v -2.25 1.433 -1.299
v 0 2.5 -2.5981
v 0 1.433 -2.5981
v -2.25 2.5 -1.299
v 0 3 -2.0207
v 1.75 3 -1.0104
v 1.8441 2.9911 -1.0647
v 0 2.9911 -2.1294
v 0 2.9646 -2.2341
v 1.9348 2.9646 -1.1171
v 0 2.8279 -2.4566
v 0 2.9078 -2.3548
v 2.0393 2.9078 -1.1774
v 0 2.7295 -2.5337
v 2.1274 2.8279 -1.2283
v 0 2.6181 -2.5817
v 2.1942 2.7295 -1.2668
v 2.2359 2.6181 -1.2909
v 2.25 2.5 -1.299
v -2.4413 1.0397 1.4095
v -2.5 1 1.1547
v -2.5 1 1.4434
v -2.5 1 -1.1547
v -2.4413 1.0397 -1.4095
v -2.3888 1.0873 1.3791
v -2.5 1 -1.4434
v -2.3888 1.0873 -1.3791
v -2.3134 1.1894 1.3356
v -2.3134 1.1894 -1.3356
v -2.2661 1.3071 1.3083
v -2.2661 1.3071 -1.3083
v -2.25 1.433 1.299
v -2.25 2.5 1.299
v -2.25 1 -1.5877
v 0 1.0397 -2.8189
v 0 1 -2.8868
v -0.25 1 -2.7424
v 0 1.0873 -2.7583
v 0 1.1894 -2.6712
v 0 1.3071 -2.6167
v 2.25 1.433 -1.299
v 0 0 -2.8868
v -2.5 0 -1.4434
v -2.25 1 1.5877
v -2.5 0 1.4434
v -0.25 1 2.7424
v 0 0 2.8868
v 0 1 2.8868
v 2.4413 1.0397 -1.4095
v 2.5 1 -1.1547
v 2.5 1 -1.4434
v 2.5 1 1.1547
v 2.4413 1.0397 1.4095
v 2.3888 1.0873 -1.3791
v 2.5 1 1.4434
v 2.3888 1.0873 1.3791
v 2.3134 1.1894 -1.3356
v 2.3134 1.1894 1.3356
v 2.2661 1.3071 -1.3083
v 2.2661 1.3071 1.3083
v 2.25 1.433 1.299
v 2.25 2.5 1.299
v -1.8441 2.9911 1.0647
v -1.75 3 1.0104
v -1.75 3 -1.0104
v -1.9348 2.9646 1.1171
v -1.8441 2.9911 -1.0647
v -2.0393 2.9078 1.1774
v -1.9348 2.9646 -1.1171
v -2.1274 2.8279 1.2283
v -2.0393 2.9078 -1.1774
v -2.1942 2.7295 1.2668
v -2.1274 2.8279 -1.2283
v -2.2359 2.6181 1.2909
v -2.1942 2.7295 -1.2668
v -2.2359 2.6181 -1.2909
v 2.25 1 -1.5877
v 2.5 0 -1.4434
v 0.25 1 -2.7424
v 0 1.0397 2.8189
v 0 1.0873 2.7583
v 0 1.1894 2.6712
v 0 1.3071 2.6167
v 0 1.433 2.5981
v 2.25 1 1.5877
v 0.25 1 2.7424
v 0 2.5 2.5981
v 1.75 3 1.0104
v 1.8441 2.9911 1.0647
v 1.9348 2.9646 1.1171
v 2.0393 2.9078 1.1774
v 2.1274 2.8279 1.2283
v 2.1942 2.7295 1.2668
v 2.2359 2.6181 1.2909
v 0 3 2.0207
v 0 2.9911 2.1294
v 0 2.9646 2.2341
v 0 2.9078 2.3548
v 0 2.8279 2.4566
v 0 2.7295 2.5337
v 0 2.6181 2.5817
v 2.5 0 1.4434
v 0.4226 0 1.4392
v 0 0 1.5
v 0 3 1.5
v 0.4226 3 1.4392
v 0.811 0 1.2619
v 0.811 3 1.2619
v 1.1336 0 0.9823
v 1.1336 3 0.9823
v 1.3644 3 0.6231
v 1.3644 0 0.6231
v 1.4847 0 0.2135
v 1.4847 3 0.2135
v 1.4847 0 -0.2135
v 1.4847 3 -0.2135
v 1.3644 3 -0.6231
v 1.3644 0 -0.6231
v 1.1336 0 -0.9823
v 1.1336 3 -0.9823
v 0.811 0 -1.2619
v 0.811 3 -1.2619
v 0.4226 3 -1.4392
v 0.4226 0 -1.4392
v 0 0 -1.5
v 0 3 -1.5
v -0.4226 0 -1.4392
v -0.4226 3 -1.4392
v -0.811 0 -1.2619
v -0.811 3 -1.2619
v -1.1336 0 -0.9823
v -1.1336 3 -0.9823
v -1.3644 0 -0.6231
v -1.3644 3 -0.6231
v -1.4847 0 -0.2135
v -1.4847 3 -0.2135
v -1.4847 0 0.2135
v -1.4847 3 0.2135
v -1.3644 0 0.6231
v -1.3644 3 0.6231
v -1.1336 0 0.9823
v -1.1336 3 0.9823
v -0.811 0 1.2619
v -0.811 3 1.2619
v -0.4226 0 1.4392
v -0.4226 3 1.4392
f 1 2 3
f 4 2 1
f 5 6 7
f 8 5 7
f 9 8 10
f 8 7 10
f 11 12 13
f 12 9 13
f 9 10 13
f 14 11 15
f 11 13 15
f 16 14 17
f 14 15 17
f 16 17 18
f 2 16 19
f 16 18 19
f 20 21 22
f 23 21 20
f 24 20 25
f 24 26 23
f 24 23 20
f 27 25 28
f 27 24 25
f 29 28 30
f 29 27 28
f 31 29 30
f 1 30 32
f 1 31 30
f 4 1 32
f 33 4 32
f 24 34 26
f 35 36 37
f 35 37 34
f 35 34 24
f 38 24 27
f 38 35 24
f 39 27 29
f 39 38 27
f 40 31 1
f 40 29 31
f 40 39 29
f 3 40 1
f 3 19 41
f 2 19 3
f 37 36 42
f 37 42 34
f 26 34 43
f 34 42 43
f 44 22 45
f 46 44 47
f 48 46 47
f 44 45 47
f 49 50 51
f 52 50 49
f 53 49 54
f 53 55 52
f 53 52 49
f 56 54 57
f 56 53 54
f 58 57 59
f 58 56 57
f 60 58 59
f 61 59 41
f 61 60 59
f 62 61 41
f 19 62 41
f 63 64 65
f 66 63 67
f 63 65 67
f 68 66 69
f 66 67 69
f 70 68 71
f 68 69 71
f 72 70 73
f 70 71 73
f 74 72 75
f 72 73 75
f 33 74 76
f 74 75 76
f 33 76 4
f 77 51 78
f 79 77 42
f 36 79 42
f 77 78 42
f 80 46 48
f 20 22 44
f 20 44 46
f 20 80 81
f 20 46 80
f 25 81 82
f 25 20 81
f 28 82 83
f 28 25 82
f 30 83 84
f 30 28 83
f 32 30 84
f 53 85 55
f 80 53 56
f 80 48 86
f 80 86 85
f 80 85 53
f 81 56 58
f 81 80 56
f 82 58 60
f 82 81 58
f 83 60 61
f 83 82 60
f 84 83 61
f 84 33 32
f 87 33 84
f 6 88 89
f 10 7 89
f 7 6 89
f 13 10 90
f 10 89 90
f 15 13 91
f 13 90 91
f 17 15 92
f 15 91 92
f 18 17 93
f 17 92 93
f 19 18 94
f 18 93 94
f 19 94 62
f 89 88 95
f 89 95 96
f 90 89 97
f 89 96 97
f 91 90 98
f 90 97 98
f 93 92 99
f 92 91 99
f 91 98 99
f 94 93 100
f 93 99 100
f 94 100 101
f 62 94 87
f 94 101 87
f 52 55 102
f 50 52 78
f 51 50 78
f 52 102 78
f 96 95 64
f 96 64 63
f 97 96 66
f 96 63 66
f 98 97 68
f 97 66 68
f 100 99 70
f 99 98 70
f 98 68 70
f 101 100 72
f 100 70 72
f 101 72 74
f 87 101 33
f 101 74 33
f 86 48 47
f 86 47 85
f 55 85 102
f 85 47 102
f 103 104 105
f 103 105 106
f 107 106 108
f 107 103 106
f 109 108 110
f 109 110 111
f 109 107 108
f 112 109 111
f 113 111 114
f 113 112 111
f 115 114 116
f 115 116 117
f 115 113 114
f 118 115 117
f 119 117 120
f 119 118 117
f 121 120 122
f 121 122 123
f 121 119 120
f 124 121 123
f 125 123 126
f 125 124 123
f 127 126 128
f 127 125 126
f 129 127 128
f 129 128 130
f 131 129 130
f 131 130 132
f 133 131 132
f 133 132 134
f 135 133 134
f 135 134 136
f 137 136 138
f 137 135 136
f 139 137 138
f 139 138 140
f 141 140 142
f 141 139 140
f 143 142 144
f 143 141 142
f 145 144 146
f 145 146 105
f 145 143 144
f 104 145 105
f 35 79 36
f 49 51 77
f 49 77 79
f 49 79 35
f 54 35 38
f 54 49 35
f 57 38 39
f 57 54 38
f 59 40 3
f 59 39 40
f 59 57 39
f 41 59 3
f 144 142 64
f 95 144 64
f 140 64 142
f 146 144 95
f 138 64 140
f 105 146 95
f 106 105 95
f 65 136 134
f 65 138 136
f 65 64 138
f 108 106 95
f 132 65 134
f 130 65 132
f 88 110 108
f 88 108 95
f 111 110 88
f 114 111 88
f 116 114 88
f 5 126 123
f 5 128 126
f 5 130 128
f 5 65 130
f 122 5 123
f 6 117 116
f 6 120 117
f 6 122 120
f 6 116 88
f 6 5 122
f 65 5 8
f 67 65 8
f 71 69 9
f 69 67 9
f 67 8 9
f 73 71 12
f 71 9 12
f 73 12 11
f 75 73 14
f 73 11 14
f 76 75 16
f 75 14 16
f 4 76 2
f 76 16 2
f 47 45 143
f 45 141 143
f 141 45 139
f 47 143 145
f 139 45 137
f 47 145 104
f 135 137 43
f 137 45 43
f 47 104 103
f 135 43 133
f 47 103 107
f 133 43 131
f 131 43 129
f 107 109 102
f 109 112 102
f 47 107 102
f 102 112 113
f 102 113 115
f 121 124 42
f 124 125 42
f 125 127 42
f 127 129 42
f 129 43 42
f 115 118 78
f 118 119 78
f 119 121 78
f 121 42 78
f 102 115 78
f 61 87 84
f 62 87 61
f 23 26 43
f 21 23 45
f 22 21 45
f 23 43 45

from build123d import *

# Parameters (mm, degrees)
SKETCH1_R           = 1.5
BOSS_EXTRUDE1_DEPTH = 3
SKETCH2_R           = 3.632993492
CUT_EXTRUDE1_DEPTH  = 2
FILLET1_R           = 0.5


with BuildPart() as part:
    # Sketch1 → Boss-Extrude1 (new body)
    with BuildSketch(Plane(origin=(0, 0, 0), x_dir=(1, 0, 0), z_dir=(0, 1, 0))):
        Polygon((0, -2.886751346), (2.5, -1.443375673), (2.5, 1.443375673), (0, 2.886751346), (-2.5, 1.443375673), (-2.5, -1.443375673), align=None)
        with Locations(Location((0, 0, 0), (0, 0, 270))):
            Circle(SKETCH1_R, mode=Mode.SUBTRACT)
    extrude(amount=BOSS_EXTRUDE1_DEPTH)

    # Sketch2 → Cut-Extrude1 (cut)
    with BuildSketch(Plane(origin=(0, 3, 0), x_dir=(1, 0, 0), z_dir=(0, 1, 0))):
        Circle(SKETCH2_R)
        Polygon((2.25, 1.299038106), (0, 2.598076211), (-2.25, 1.299038106), (-2.25, -1.299038106), (0, -2.598076211), (2.25, -1.299038106), align=None, mode=Mode.SUBTRACT)
    extrude(amount=-CUT_EXTRUDE1_DEPTH, mode=Mode.SUBTRACT)

    # Fillet1
    # the kernel refuses this fillet: 0.5 mm, written as the material it adds along each edge
    with BuildSketch(Plane(origin=(-0.9375, 1, 3.139342089), x_dir=(0.5000000000000002, 7.10542735760069e-14, 0.8660254037844385), z_dir=(0.8660254037844386, 0, -0.5000000000000002))) as fillet1_piece_1_section:
        with BuildLine():
            CenterArc((0.5, -0.433012702), FILLET1_R, 120, 60)
            Line((0, -0.433012702), (0, 0))
            Line((0, 0), (0.25, 0))
        make_face()
    fillet1_piece_1 = extrude(amount=4.763139721, mode=Mode.PRIVATE)
    fillet1_piece_1 = split(fillet1_piece_1, bisect_by=Plane(origin=(2.25, 1, 3.139342089), z_dir=(-1, 0, 0)), keep=Keep.TOP, mode=Mode.PRIVATE)
    fillet1_piece_1 = split(fillet1_piece_1, bisect_by=Plane(origin=(-0.46875, 1, 2.327443273), z_dir=(0.4999999999999999, 0, -0.8660254037844387)), keep=Keep.TOP, mode=Mode.PRIVATE)
    add(fillet1_piece_1)
    with BuildSketch(Plane(origin=(2.25, 1, 2.38156986), x_dir=(1, 0, 0), z_dir=(0, 0, -1))) as fillet1_piece_2_section:
        with BuildLine():
            CenterArc((0.5, -0.433012702), FILLET1_R, 120, 60)
            Line((0, -0.433012702), (0, 0))
            Line((0, 0), (0.25, 0))
        make_face()
    fillet1_piece_2 = extrude(amount=4.763139721, mode=Mode.PRIVATE)
    fillet1_piece_2 = split(fillet1_piece_2, bisect_by=Plane(origin=(1.78125, 1, 1.569671044), z_dir=(-0.5000000000000002, 0, -0.8660254037844386)), keep=Keep.TOP, mode=Mode.PRIVATE)
    fillet1_piece_2 = split(fillet1_piece_2, bisect_by=Plane(origin=(3.84375, 1, -0.378886114), z_dir=(-0.49999999999999956, 0, 0.8660254037844389)), keep=Keep.TOP, mode=Mode.PRIVATE)
    add(fillet1_piece_2)
    with BuildSketch(Plane(origin=(3.1875, 1, -0.757772228), x_dir=(0.49999999999999956, 7.194245199570714e-14, -0.8660254037844388), z_dir=(-0.8660254037844389, 0, -0.49999999999999956))) as fillet1_piece_3_section:
        with BuildLine():
            CenterArc((0.5, -0.433012702), FILLET1_R, 120, 60)
            Line((0, -0.433012702), (0, 0))
            Line((0, 0), (0.25, 0))
        make_face()
    fillet1_piece_3 = extrude(amount=4.763139721, mode=Mode.PRIVATE)
    fillet1_piece_3 = split(fillet1_piece_3, bisect_by=Plane(origin=(2.25, 1, -0.757772228), z_dir=(-1, 0, 0)), keep=Keep.TOP, mode=Mode.PRIVATE)
    fillet1_piece_3 = split(fillet1_piece_3, bisect_by=Plane(origin=(1.59375, 1, -3.518228203), z_dir=(0.5000000000000002, 0, 0.8660254037844385)), keep=Keep.TOP, mode=Mode.PRIVATE)
    add(fillet1_piece_3)
    with BuildSketch(Plane(origin=(0.9375, 1, -3.139342089), x_dir=(-0.5000000000000003, 7.283063041540705e-14, -0.8660254037844386), z_dir=(-0.8660254037844386, 0, 0.5000000000000003))) as fillet1_piece_4_section:
        with BuildLine():
            CenterArc((0.5, -0.433012702), FILLET1_R, 120, 60)
            Line((0, -0.433012702), (0, 0))
            Line((0, 0), (0.25, 0))
        make_face()
    fillet1_piece_4 = extrude(amount=4.763139721, mode=Mode.PRIVATE)
    fillet1_piece_4 = split(fillet1_piece_4, bisect_by=Plane(origin=(0.46875, 1, -2.327443273), z_dir=(-0.49999999999999956, 0, 0.8660254037844389)), keep=Keep.TOP, mode=Mode.PRIVATE)
    fillet1_piece_4 = split(fillet1_piece_4, bisect_by=Plane(origin=(-2.25, 1, -3.139342089), z_dir=(1, 0, 0)), keep=Keep.TOP, mode=Mode.PRIVATE)
    add(fillet1_piece_4)
    with BuildSketch(Plane(origin=(-2.25, 1, -2.38156986), x_dir=(-1, 0, 0), z_dir=(0, 0, 1))) as fillet1_piece_5_section:
        with BuildLine():
            CenterArc((0.5, -0.433012702), FILLET1_R, 120, 60)
            Line((0, -0.433012702), (0, 0))
            Line((0, 0), (0.25, 0))
        make_face()
    fillet1_piece_5 = extrude(amount=4.763139721, mode=Mode.PRIVATE)
    fillet1_piece_5 = split(fillet1_piece_5, bisect_by=Plane(origin=(-3.84375, 1, 0.378886114), z_dir=(0.4999999999999999, 0, -0.8660254037844387)), keep=Keep.TOP, mode=Mode.PRIVATE)
    fillet1_piece_5 = split(fillet1_piece_5, bisect_by=Plane(origin=(-1.78125, 1, -1.569671044), z_dir=(0.5000000000000002, 0, 0.8660254037844385)), keep=Keep.TOP, mode=Mode.PRIVATE)
    add(fillet1_piece_5)
    with BuildSketch(Plane(origin=(-3.1875, 1, 0.757772228), x_dir=(-0.4999999999999999, 7.194245199570713e-14, 0.8660254037844387), z_dir=(0.8660254037844387, 0, 0.4999999999999999))) as fillet1_piece_6_section:
        with BuildLine():
            CenterArc((0.5, -0.433012702), FILLET1_R, 120, 60)
            Line((0, -0.433012702), (0, 0))
            Line((0, 0), (0.25, 0))
        make_face()
    fillet1_piece_6 = extrude(amount=4.763139721, mode=Mode.PRIVATE)
    fillet1_piece_6 = split(fillet1_piece_6, bisect_by=Plane(origin=(-1.59375, 1, 3.518228203), z_dir=(-0.5000000000000002, 0, -0.8660254037844386)), keep=Keep.TOP, mode=Mode.PRIVATE)
    fillet1_piece_6 = split(fillet1_piece_6, bisect_by=Plane(origin=(-2.25, 1, 0.757772228), z_dir=(1, 0, 0)), keep=Keep.TOP, mode=Mode.PRIVATE)
    add(fillet1_piece_6)
    with BuildSketch(Plane(origin=(-0.9375, 1, 3.139342089), x_dir=(0.5000000000000002, 7.10542735760069e-14, 0.8660254037844385), z_dir=(0.8660254037844386, 0, -0.5000000000000002))) as fillet1_piece_7a_section:
        with BuildLine():
            CenterArc((0.5, -0.433012702), FILLET1_R, 120, 60)
            Line((0, -0.433012702), (0, 0))
            Line((0, 0), (0.25, 0))
        make_face()
    fillet1_piece_7a = extrude(amount=4.763139721, mode=Mode.PRIVATE)
    fillet1_piece_7a = split(fillet1_piece_7a, bisect_by=Plane(origin=(-0.59375, 1, 2.543949624), z_dir=(0.49999999999999983, 0, -0.8660254037844387)), keep=Keep.TOP, mode=Mode.PRIVATE)
    fillet1_piece_7a = split(fillet1_piece_7a, bisect_by=Plane(origin=(-0.46875, 1, 2.327443273), z_dir=(-0.4999999999999999, 0, 0.8660254037844387)), keep=Keep.TOP, mode=Mode.PRIVATE)
    with BuildSketch(Plane(origin=(-3.1875, 1, 0.757772228), x_dir=(-0.4999999999999999, 7.194245199570713e-14, 0.8660254037844387), z_dir=(0.8660254037844387, 0, 0.4999999999999999))) as fillet1_piece_7b_section:
        with BuildLine():
            CenterArc((0.5, -0.433012702), FILLET1_R, 120, 60)
            Line((0, -0.433012702), (0, 0))
            Line((0, 0), (0.25, 0))
        make_face()
    fillet1_piece_7b = extrude(amount=4.763139721, mode=Mode.PRIVATE)
    fillet1_piece_7b = split(fillet1_piece_7b, bisect_by=Plane(origin=(-1.46875, 1, 3.734734554), z_dir=(-0.5000000000000001, 0, -0.8660254037844387)), keep=Keep.TOP, mode=Mode.PRIVATE)
    fillet1_piece_7b = split(fillet1_piece_7b, bisect_by=Plane(origin=(-1.59375, 1, 3.518228203), z_dir=(0.5000000000000002, 0, 0.8660254037844386)), keep=Keep.TOP, mode=Mode.PRIVATE)
    fillet1_piece_7 = fillet1_piece_7a & fillet1_piece_7b
    add(fillet1_piece_7)
    with BuildSketch(Plane(origin=(2.25, 1, 2.38156986), x_dir=(1, 0, 0), z_dir=(0, 0, -1))) as fillet1_piece_8a_section:
        with BuildLine():
            CenterArc((0.5, -0.433012702), FILLET1_R, 120, 60)
            Line((0, -0.433012702), (0, 0))
            Line((0, 0), (0.25, 0))
        make_face()
    fillet1_piece_8a = extrude(amount=4.763139721, mode=Mode.PRIVATE)
    fillet1_piece_8a = split(fillet1_piece_8a, bisect_by=Plane(origin=(1.90625, 1, 1.786177395), z_dir=(-0.5000000000000001, 0, -0.8660254037844387)), keep=Keep.TOP, mode=Mode.PRIVATE)
    fillet1_piece_8a = split(fillet1_piece_8a, bisect_by=Plane(origin=(1.78125, 1, 1.569671044), z_dir=(0.5000000000000002, 0, 0.8660254037844386)), keep=Keep.TOP, mode=Mode.PRIVATE)
    with BuildSketch(Plane(origin=(-0.9375, 1, 3.139342089), x_dir=(0.5000000000000002, 7.10542735760069e-14, 0.8660254037844385), z_dir=(0.8660254037844386, 0, -0.5000000000000002))) as fillet1_piece_8b_section:
        with BuildLine():
            CenterArc((0.5, -0.433012702), FILLET1_R, 120, 60)
            Line((0, -0.433012702), (0, 0))
            Line((0, 0), (0.25, 0))
        make_face()
    fillet1_piece_8b = extrude(amount=4.763139721, mode=Mode.PRIVATE)
    fillet1_piece_8b = split(fillet1_piece_8b, bisect_by=Plane(origin=(2.5, 1, 3.139342089), z_dir=(-1, 0, 0)), keep=Keep.TOP, mode=Mode.PRIVATE)
    fillet1_piece_8b = split(fillet1_piece_8b, bisect_by=Plane(origin=(2.25, 1, 3.139342089), z_dir=(1, 0, 0)), keep=Keep.TOP, mode=Mode.PRIVATE)
    fillet1_piece_8 = fillet1_piece_8a & fillet1_piece_8b
    add(fillet1_piece_8)
    with BuildSketch(Plane(origin=(2.25, 1, 2.38156986), x_dir=(1, 0, 0), z_dir=(0, 0, -1))) as fillet1_piece_9a_section:
        with BuildLine():
            CenterArc((0.5, -0.433012702), FILLET1_R, 120, 60)
            Line((0, -0.433012702), (0, 0))
            Line((0, 0), (0.25, 0))
        make_face()
    fillet1_piece_9a = extrude(amount=4.763139721, mode=Mode.PRIVATE)
    fillet1_piece_9a = split(fillet1_piece_9a, bisect_by=Plane(origin=(3.96875, 1, -0.595392465), z_dir=(-0.49999999999999967, 0, 0.8660254037844388)), keep=Keep.TOP, mode=Mode.PRIVATE)
    fillet1_piece_9a = split(fillet1_piece_9a, bisect_by=Plane(origin=(3.84375, 1, -0.378886114), z_dir=(0.49999999999999956, 0, -0.8660254037844389)), keep=Keep.TOP, mode=Mode.PRIVATE)
    with BuildSketch(Plane(origin=(3.1875, 1, -0.757772228), x_dir=(0.49999999999999956, 7.194245199570714e-14, -0.8660254037844388), z_dir=(-0.8660254037844389, 0, -0.49999999999999956))) as fillet1_piece_9b_section:
        with BuildLine():
            CenterArc((0.5, -0.433012702), FILLET1_R, 120, 60)
            Line((0, -0.433012702), (0, 0))
            Line((0, 0), (0.25, 0))
        make_face()
    fillet1_piece_9b = extrude(amount=4.763139721, mode=Mode.PRIVATE)
    fillet1_piece_9b = split(fillet1_piece_9b, bisect_by=Plane(origin=(2.5, 1, -0.757772228), z_dir=(-1, 0, 0)), keep=Keep.TOP, mode=Mode.PRIVATE)
    fillet1_piece_9b = split(fillet1_piece_9b, bisect_by=Plane(origin=(2.25, 1, -0.757772228), z_dir=(1, 0, 0)), keep=Keep.TOP, mode=Mode.PRIVATE)
    fillet1_piece_9 = fillet1_piece_9a & fillet1_piece_9b
    add(fillet1_piece_9)
    with BuildSketch(Plane(origin=(3.1875, 1, -0.757772228), x_dir=(0.49999999999999956, 7.194245199570714e-14, -0.8660254037844388), z_dir=(-0.8660254037844389, 0, -0.49999999999999956))) as fillet1_piece_10a_section:
        with BuildLine():
            CenterArc((0.5, -0.433012702), FILLET1_R, 120, 60)
            Line((0, -0.433012702), (0, 0))
            Line((0, 0), (0.25, 0))
        make_face()
    fillet1_piece_10a = extrude(amount=4.763139721, mode=Mode.PRIVATE)
    fillet1_piece_10a = split(fillet1_piece_10a, bisect_by=Plane(origin=(1.46875, 1, -3.734734554), z_dir=(0.5000000000000002, 0, 0.8660254037844386)), keep=Keep.TOP, mode=Mode.PRIVATE)
    fillet1_piece_10a = split(fillet1_piece_10a, bisect_by=Plane(origin=(1.59375, 1, -3.518228203), z_dir=(-0.5000000000000002, 0, -0.8660254037844385)), keep=Keep.TOP, mode=Mode.PRIVATE)
    with BuildSketch(Plane(origin=(0.9375, 1, -3.139342089), x_dir=(-0.5000000000000003, 7.283063041540705e-14, -0.8660254037844386), z_dir=(-0.8660254037844386, 0, 0.5000000000000003))) as fillet1_piece_10b_section:
        with BuildLine():
            CenterArc((0.5, -0.433012702), FILLET1_R, 120, 60)
            Line((0, -0.433012702), (0, 0))
            Line((0, 0), (0.25, 0))
        make_face()
    fillet1_piece_10b = extrude(amount=4.763139721, mode=Mode.PRIVATE)
    fillet1_piece_10b = split(fillet1_piece_10b, bisect_by=Plane(origin=(0.59375, 1, -2.543949624), z_dir=(-0.49999999999999967, 0, 0.8660254037844388)), keep=Keep.TOP, mode=Mode.PRIVATE)
    fillet1_piece_10b = split(fillet1_piece_10b, bisect_by=Plane(origin=(0.46875, 1, -2.327443273), z_dir=(0.49999999999999956, 0, -0.8660254037844389)), keep=Keep.TOP, mode=Mode.PRIVATE)
    fillet1_piece_10 = fillet1_piece_10a & fillet1_piece_10b
    add(fillet1_piece_10)
    with BuildSketch(Plane(origin=(0.9375, 1, -3.139342089), x_dir=(-0.5000000000000003, 7.283063041540705e-14, -0.8660254037844386), z_dir=(-0.8660254037844386, 0, 0.5000000000000003))) as fillet1_piece_11a_section:
        with BuildLine():
            CenterArc((0.5, -0.433012702), FILLET1_R, 120, 60)
            Line((0, -0.433012702), (0, 0))
            Line((0, 0), (0.25, 0))
        make_face()
    fillet1_piece_11a = extrude(amount=4.763139721, mode=Mode.PRIVATE)
    fillet1_piece_11a = split(fillet1_piece_11a, bisect_by=Plane(origin=(-2.5, 1, -3.139342089), z_dir=(1, 0, 0)), keep=Keep.TOP, mode=Mode.PRIVATE)
    fillet1_piece_11a = split(fillet1_piece_11a, bisect_by=Plane(origin=(-2.25, 1, -3.139342089), z_dir=(-1, 0, 0)), keep=Keep.TOP, mode=Mode.PRIVATE)
    with BuildSketch(Plane(origin=(-2.25, 1, -2.38156986), x_dir=(-1, 0, 0), z_dir=(0, 0, 1))) as fillet1_piece_11b_section:
        with BuildLine():
            CenterArc((0.5, -0.433012702), FILLET1_R, 120, 60)
            Line((0, -0.433012702), (0, 0))
            Line((0, 0), (0.25, 0))
        make_face()
    fillet1_piece_11b = extrude(amount=4.763139721, mode=Mode.PRIVATE)
    fillet1_piece_11b = split(fillet1_piece_11b, bisect_by=Plane(origin=(-1.90625, 1, -1.786177395), z_dir=(0.5000000000000002, 0, 0.8660254037844386)), keep=Keep.TOP, mode=Mode.PRIVATE)
    fillet1_piece_11b = split(fillet1_piece_11b, bisect_by=Plane(origin=(-1.78125, 1, -1.569671044), z_dir=(-0.5000000000000002, 0, -0.8660254037844385)), keep=Keep.TOP, mode=Mode.PRIVATE)
    fillet1_piece_11 = fillet1_piece_11a & fillet1_piece_11b
    add(fillet1_piece_11)
    with BuildSketch(Plane(origin=(-3.1875, 1, 0.757772228), x_dir=(-0.4999999999999999, 7.194245199570713e-14, 0.8660254037844387), z_dir=(0.8660254037844387, 0, 0.4999999999999999))) as fillet1_piece_12a_section:
        with BuildLine():
            CenterArc((0.5, -0.433012702), FILLET1_R, 120, 60)
            Line((0, -0.433012702), (0, 0))
            Line((0, 0), (0.25, 0))
        make_face()
    fillet1_piece_12a = extrude(amount=4.763139721, mode=Mode.PRIVATE)
    fillet1_piece_12a = split(fillet1_piece_12a, bisect_by=Plane(origin=(-2.5, 1, 0.757772228), z_dir=(1, 0, 0)), keep=Keep.TOP, mode=Mode.PRIVATE)
    fillet1_piece_12a = split(fillet1_piece_12a, bisect_by=Plane(origin=(-2.25, 1, 0.757772228), z_dir=(-1, 0, 0)), keep=Keep.TOP, mode=Mode.PRIVATE)
    with BuildSketch(Plane(origin=(-2.25, 1, -2.38156986), x_dir=(-1, 0, 0), z_dir=(0, 0, 1))) as fillet1_piece_12b_section:
        with BuildLine():
            CenterArc((0.5, -0.433012702), FILLET1_R, 120, 60)
            Line((0, -0.433012702), (0, 0))
            Line((0, 0), (0.25, 0))
        make_face()
    fillet1_piece_12b = extrude(amount=4.763139721, mode=Mode.PRIVATE)
    fillet1_piece_12b = split(fillet1_piece_12b, bisect_by=Plane(origin=(-3.96875, 1, 0.595392465), z_dir=(0.49999999999999983, 0, -0.8660254037844387)), keep=Keep.TOP, mode=Mode.PRIVATE)
    fillet1_piece_12b = split(fillet1_piece_12b, bisect_by=Plane(origin=(-3.84375, 1, 0.378886114), z_dir=(-0.4999999999999999, 0, 0.8660254037844387)), keep=Keep.TOP, mode=Mode.PRIVATE)
    fillet1_piece_12 = fillet1_piece_12a & fillet1_piece_12b
    add(fillet1_piece_12)
    # the kernel refuses this fillet: 0.5 mm, written as the material it takes off along each edge
    with BuildSketch(Plane(origin=(2.25, 3, 2.549038106), x_dir=(0, -1, 0), z_dir=(0, 0, -1)), Plane(origin=(-1.082531755, 3, 3.223076211), x_dir=(0, -1, 0), z_dir=(0.8660254037844386, 0, -0.5000000000000002)), Plane(origin=(-3.332531755, 3, 0.674038106), x_dir=(0, -1, 0), z_dir=(0.8660254037844387, 0, 0.4999999999999999)), Plane(origin=(-2.25, 3, -2.549038106), x_dir=(0, -1, 0), z_dir=(0, 0, 1)), Plane(origin=(1.082531755, 3, -3.223076211), x_dir=(0, -1, 0), z_dir=(-0.8660254037844386, 0, 0.5000000000000003)), Plane(origin=(3.332531755, 3, -0.674038106), x_dir=(0, -1, 0), z_dir=(-0.8660254037844389, 0, -0.49999999999999956))) as fillet1_2_piece_1:
        with BuildLine():
            CenterArc((FILLET1_R, FILLET1_R), FILLET1_R, 180, 90)
            Line((0, FILLET1_R), (0, 0))
            Line((0, 0), (FILLET1_R, 0))
        make_face()
    extrude(amount=5.098076211, mode=Mode.SUBTRACT)


solid = part.part
